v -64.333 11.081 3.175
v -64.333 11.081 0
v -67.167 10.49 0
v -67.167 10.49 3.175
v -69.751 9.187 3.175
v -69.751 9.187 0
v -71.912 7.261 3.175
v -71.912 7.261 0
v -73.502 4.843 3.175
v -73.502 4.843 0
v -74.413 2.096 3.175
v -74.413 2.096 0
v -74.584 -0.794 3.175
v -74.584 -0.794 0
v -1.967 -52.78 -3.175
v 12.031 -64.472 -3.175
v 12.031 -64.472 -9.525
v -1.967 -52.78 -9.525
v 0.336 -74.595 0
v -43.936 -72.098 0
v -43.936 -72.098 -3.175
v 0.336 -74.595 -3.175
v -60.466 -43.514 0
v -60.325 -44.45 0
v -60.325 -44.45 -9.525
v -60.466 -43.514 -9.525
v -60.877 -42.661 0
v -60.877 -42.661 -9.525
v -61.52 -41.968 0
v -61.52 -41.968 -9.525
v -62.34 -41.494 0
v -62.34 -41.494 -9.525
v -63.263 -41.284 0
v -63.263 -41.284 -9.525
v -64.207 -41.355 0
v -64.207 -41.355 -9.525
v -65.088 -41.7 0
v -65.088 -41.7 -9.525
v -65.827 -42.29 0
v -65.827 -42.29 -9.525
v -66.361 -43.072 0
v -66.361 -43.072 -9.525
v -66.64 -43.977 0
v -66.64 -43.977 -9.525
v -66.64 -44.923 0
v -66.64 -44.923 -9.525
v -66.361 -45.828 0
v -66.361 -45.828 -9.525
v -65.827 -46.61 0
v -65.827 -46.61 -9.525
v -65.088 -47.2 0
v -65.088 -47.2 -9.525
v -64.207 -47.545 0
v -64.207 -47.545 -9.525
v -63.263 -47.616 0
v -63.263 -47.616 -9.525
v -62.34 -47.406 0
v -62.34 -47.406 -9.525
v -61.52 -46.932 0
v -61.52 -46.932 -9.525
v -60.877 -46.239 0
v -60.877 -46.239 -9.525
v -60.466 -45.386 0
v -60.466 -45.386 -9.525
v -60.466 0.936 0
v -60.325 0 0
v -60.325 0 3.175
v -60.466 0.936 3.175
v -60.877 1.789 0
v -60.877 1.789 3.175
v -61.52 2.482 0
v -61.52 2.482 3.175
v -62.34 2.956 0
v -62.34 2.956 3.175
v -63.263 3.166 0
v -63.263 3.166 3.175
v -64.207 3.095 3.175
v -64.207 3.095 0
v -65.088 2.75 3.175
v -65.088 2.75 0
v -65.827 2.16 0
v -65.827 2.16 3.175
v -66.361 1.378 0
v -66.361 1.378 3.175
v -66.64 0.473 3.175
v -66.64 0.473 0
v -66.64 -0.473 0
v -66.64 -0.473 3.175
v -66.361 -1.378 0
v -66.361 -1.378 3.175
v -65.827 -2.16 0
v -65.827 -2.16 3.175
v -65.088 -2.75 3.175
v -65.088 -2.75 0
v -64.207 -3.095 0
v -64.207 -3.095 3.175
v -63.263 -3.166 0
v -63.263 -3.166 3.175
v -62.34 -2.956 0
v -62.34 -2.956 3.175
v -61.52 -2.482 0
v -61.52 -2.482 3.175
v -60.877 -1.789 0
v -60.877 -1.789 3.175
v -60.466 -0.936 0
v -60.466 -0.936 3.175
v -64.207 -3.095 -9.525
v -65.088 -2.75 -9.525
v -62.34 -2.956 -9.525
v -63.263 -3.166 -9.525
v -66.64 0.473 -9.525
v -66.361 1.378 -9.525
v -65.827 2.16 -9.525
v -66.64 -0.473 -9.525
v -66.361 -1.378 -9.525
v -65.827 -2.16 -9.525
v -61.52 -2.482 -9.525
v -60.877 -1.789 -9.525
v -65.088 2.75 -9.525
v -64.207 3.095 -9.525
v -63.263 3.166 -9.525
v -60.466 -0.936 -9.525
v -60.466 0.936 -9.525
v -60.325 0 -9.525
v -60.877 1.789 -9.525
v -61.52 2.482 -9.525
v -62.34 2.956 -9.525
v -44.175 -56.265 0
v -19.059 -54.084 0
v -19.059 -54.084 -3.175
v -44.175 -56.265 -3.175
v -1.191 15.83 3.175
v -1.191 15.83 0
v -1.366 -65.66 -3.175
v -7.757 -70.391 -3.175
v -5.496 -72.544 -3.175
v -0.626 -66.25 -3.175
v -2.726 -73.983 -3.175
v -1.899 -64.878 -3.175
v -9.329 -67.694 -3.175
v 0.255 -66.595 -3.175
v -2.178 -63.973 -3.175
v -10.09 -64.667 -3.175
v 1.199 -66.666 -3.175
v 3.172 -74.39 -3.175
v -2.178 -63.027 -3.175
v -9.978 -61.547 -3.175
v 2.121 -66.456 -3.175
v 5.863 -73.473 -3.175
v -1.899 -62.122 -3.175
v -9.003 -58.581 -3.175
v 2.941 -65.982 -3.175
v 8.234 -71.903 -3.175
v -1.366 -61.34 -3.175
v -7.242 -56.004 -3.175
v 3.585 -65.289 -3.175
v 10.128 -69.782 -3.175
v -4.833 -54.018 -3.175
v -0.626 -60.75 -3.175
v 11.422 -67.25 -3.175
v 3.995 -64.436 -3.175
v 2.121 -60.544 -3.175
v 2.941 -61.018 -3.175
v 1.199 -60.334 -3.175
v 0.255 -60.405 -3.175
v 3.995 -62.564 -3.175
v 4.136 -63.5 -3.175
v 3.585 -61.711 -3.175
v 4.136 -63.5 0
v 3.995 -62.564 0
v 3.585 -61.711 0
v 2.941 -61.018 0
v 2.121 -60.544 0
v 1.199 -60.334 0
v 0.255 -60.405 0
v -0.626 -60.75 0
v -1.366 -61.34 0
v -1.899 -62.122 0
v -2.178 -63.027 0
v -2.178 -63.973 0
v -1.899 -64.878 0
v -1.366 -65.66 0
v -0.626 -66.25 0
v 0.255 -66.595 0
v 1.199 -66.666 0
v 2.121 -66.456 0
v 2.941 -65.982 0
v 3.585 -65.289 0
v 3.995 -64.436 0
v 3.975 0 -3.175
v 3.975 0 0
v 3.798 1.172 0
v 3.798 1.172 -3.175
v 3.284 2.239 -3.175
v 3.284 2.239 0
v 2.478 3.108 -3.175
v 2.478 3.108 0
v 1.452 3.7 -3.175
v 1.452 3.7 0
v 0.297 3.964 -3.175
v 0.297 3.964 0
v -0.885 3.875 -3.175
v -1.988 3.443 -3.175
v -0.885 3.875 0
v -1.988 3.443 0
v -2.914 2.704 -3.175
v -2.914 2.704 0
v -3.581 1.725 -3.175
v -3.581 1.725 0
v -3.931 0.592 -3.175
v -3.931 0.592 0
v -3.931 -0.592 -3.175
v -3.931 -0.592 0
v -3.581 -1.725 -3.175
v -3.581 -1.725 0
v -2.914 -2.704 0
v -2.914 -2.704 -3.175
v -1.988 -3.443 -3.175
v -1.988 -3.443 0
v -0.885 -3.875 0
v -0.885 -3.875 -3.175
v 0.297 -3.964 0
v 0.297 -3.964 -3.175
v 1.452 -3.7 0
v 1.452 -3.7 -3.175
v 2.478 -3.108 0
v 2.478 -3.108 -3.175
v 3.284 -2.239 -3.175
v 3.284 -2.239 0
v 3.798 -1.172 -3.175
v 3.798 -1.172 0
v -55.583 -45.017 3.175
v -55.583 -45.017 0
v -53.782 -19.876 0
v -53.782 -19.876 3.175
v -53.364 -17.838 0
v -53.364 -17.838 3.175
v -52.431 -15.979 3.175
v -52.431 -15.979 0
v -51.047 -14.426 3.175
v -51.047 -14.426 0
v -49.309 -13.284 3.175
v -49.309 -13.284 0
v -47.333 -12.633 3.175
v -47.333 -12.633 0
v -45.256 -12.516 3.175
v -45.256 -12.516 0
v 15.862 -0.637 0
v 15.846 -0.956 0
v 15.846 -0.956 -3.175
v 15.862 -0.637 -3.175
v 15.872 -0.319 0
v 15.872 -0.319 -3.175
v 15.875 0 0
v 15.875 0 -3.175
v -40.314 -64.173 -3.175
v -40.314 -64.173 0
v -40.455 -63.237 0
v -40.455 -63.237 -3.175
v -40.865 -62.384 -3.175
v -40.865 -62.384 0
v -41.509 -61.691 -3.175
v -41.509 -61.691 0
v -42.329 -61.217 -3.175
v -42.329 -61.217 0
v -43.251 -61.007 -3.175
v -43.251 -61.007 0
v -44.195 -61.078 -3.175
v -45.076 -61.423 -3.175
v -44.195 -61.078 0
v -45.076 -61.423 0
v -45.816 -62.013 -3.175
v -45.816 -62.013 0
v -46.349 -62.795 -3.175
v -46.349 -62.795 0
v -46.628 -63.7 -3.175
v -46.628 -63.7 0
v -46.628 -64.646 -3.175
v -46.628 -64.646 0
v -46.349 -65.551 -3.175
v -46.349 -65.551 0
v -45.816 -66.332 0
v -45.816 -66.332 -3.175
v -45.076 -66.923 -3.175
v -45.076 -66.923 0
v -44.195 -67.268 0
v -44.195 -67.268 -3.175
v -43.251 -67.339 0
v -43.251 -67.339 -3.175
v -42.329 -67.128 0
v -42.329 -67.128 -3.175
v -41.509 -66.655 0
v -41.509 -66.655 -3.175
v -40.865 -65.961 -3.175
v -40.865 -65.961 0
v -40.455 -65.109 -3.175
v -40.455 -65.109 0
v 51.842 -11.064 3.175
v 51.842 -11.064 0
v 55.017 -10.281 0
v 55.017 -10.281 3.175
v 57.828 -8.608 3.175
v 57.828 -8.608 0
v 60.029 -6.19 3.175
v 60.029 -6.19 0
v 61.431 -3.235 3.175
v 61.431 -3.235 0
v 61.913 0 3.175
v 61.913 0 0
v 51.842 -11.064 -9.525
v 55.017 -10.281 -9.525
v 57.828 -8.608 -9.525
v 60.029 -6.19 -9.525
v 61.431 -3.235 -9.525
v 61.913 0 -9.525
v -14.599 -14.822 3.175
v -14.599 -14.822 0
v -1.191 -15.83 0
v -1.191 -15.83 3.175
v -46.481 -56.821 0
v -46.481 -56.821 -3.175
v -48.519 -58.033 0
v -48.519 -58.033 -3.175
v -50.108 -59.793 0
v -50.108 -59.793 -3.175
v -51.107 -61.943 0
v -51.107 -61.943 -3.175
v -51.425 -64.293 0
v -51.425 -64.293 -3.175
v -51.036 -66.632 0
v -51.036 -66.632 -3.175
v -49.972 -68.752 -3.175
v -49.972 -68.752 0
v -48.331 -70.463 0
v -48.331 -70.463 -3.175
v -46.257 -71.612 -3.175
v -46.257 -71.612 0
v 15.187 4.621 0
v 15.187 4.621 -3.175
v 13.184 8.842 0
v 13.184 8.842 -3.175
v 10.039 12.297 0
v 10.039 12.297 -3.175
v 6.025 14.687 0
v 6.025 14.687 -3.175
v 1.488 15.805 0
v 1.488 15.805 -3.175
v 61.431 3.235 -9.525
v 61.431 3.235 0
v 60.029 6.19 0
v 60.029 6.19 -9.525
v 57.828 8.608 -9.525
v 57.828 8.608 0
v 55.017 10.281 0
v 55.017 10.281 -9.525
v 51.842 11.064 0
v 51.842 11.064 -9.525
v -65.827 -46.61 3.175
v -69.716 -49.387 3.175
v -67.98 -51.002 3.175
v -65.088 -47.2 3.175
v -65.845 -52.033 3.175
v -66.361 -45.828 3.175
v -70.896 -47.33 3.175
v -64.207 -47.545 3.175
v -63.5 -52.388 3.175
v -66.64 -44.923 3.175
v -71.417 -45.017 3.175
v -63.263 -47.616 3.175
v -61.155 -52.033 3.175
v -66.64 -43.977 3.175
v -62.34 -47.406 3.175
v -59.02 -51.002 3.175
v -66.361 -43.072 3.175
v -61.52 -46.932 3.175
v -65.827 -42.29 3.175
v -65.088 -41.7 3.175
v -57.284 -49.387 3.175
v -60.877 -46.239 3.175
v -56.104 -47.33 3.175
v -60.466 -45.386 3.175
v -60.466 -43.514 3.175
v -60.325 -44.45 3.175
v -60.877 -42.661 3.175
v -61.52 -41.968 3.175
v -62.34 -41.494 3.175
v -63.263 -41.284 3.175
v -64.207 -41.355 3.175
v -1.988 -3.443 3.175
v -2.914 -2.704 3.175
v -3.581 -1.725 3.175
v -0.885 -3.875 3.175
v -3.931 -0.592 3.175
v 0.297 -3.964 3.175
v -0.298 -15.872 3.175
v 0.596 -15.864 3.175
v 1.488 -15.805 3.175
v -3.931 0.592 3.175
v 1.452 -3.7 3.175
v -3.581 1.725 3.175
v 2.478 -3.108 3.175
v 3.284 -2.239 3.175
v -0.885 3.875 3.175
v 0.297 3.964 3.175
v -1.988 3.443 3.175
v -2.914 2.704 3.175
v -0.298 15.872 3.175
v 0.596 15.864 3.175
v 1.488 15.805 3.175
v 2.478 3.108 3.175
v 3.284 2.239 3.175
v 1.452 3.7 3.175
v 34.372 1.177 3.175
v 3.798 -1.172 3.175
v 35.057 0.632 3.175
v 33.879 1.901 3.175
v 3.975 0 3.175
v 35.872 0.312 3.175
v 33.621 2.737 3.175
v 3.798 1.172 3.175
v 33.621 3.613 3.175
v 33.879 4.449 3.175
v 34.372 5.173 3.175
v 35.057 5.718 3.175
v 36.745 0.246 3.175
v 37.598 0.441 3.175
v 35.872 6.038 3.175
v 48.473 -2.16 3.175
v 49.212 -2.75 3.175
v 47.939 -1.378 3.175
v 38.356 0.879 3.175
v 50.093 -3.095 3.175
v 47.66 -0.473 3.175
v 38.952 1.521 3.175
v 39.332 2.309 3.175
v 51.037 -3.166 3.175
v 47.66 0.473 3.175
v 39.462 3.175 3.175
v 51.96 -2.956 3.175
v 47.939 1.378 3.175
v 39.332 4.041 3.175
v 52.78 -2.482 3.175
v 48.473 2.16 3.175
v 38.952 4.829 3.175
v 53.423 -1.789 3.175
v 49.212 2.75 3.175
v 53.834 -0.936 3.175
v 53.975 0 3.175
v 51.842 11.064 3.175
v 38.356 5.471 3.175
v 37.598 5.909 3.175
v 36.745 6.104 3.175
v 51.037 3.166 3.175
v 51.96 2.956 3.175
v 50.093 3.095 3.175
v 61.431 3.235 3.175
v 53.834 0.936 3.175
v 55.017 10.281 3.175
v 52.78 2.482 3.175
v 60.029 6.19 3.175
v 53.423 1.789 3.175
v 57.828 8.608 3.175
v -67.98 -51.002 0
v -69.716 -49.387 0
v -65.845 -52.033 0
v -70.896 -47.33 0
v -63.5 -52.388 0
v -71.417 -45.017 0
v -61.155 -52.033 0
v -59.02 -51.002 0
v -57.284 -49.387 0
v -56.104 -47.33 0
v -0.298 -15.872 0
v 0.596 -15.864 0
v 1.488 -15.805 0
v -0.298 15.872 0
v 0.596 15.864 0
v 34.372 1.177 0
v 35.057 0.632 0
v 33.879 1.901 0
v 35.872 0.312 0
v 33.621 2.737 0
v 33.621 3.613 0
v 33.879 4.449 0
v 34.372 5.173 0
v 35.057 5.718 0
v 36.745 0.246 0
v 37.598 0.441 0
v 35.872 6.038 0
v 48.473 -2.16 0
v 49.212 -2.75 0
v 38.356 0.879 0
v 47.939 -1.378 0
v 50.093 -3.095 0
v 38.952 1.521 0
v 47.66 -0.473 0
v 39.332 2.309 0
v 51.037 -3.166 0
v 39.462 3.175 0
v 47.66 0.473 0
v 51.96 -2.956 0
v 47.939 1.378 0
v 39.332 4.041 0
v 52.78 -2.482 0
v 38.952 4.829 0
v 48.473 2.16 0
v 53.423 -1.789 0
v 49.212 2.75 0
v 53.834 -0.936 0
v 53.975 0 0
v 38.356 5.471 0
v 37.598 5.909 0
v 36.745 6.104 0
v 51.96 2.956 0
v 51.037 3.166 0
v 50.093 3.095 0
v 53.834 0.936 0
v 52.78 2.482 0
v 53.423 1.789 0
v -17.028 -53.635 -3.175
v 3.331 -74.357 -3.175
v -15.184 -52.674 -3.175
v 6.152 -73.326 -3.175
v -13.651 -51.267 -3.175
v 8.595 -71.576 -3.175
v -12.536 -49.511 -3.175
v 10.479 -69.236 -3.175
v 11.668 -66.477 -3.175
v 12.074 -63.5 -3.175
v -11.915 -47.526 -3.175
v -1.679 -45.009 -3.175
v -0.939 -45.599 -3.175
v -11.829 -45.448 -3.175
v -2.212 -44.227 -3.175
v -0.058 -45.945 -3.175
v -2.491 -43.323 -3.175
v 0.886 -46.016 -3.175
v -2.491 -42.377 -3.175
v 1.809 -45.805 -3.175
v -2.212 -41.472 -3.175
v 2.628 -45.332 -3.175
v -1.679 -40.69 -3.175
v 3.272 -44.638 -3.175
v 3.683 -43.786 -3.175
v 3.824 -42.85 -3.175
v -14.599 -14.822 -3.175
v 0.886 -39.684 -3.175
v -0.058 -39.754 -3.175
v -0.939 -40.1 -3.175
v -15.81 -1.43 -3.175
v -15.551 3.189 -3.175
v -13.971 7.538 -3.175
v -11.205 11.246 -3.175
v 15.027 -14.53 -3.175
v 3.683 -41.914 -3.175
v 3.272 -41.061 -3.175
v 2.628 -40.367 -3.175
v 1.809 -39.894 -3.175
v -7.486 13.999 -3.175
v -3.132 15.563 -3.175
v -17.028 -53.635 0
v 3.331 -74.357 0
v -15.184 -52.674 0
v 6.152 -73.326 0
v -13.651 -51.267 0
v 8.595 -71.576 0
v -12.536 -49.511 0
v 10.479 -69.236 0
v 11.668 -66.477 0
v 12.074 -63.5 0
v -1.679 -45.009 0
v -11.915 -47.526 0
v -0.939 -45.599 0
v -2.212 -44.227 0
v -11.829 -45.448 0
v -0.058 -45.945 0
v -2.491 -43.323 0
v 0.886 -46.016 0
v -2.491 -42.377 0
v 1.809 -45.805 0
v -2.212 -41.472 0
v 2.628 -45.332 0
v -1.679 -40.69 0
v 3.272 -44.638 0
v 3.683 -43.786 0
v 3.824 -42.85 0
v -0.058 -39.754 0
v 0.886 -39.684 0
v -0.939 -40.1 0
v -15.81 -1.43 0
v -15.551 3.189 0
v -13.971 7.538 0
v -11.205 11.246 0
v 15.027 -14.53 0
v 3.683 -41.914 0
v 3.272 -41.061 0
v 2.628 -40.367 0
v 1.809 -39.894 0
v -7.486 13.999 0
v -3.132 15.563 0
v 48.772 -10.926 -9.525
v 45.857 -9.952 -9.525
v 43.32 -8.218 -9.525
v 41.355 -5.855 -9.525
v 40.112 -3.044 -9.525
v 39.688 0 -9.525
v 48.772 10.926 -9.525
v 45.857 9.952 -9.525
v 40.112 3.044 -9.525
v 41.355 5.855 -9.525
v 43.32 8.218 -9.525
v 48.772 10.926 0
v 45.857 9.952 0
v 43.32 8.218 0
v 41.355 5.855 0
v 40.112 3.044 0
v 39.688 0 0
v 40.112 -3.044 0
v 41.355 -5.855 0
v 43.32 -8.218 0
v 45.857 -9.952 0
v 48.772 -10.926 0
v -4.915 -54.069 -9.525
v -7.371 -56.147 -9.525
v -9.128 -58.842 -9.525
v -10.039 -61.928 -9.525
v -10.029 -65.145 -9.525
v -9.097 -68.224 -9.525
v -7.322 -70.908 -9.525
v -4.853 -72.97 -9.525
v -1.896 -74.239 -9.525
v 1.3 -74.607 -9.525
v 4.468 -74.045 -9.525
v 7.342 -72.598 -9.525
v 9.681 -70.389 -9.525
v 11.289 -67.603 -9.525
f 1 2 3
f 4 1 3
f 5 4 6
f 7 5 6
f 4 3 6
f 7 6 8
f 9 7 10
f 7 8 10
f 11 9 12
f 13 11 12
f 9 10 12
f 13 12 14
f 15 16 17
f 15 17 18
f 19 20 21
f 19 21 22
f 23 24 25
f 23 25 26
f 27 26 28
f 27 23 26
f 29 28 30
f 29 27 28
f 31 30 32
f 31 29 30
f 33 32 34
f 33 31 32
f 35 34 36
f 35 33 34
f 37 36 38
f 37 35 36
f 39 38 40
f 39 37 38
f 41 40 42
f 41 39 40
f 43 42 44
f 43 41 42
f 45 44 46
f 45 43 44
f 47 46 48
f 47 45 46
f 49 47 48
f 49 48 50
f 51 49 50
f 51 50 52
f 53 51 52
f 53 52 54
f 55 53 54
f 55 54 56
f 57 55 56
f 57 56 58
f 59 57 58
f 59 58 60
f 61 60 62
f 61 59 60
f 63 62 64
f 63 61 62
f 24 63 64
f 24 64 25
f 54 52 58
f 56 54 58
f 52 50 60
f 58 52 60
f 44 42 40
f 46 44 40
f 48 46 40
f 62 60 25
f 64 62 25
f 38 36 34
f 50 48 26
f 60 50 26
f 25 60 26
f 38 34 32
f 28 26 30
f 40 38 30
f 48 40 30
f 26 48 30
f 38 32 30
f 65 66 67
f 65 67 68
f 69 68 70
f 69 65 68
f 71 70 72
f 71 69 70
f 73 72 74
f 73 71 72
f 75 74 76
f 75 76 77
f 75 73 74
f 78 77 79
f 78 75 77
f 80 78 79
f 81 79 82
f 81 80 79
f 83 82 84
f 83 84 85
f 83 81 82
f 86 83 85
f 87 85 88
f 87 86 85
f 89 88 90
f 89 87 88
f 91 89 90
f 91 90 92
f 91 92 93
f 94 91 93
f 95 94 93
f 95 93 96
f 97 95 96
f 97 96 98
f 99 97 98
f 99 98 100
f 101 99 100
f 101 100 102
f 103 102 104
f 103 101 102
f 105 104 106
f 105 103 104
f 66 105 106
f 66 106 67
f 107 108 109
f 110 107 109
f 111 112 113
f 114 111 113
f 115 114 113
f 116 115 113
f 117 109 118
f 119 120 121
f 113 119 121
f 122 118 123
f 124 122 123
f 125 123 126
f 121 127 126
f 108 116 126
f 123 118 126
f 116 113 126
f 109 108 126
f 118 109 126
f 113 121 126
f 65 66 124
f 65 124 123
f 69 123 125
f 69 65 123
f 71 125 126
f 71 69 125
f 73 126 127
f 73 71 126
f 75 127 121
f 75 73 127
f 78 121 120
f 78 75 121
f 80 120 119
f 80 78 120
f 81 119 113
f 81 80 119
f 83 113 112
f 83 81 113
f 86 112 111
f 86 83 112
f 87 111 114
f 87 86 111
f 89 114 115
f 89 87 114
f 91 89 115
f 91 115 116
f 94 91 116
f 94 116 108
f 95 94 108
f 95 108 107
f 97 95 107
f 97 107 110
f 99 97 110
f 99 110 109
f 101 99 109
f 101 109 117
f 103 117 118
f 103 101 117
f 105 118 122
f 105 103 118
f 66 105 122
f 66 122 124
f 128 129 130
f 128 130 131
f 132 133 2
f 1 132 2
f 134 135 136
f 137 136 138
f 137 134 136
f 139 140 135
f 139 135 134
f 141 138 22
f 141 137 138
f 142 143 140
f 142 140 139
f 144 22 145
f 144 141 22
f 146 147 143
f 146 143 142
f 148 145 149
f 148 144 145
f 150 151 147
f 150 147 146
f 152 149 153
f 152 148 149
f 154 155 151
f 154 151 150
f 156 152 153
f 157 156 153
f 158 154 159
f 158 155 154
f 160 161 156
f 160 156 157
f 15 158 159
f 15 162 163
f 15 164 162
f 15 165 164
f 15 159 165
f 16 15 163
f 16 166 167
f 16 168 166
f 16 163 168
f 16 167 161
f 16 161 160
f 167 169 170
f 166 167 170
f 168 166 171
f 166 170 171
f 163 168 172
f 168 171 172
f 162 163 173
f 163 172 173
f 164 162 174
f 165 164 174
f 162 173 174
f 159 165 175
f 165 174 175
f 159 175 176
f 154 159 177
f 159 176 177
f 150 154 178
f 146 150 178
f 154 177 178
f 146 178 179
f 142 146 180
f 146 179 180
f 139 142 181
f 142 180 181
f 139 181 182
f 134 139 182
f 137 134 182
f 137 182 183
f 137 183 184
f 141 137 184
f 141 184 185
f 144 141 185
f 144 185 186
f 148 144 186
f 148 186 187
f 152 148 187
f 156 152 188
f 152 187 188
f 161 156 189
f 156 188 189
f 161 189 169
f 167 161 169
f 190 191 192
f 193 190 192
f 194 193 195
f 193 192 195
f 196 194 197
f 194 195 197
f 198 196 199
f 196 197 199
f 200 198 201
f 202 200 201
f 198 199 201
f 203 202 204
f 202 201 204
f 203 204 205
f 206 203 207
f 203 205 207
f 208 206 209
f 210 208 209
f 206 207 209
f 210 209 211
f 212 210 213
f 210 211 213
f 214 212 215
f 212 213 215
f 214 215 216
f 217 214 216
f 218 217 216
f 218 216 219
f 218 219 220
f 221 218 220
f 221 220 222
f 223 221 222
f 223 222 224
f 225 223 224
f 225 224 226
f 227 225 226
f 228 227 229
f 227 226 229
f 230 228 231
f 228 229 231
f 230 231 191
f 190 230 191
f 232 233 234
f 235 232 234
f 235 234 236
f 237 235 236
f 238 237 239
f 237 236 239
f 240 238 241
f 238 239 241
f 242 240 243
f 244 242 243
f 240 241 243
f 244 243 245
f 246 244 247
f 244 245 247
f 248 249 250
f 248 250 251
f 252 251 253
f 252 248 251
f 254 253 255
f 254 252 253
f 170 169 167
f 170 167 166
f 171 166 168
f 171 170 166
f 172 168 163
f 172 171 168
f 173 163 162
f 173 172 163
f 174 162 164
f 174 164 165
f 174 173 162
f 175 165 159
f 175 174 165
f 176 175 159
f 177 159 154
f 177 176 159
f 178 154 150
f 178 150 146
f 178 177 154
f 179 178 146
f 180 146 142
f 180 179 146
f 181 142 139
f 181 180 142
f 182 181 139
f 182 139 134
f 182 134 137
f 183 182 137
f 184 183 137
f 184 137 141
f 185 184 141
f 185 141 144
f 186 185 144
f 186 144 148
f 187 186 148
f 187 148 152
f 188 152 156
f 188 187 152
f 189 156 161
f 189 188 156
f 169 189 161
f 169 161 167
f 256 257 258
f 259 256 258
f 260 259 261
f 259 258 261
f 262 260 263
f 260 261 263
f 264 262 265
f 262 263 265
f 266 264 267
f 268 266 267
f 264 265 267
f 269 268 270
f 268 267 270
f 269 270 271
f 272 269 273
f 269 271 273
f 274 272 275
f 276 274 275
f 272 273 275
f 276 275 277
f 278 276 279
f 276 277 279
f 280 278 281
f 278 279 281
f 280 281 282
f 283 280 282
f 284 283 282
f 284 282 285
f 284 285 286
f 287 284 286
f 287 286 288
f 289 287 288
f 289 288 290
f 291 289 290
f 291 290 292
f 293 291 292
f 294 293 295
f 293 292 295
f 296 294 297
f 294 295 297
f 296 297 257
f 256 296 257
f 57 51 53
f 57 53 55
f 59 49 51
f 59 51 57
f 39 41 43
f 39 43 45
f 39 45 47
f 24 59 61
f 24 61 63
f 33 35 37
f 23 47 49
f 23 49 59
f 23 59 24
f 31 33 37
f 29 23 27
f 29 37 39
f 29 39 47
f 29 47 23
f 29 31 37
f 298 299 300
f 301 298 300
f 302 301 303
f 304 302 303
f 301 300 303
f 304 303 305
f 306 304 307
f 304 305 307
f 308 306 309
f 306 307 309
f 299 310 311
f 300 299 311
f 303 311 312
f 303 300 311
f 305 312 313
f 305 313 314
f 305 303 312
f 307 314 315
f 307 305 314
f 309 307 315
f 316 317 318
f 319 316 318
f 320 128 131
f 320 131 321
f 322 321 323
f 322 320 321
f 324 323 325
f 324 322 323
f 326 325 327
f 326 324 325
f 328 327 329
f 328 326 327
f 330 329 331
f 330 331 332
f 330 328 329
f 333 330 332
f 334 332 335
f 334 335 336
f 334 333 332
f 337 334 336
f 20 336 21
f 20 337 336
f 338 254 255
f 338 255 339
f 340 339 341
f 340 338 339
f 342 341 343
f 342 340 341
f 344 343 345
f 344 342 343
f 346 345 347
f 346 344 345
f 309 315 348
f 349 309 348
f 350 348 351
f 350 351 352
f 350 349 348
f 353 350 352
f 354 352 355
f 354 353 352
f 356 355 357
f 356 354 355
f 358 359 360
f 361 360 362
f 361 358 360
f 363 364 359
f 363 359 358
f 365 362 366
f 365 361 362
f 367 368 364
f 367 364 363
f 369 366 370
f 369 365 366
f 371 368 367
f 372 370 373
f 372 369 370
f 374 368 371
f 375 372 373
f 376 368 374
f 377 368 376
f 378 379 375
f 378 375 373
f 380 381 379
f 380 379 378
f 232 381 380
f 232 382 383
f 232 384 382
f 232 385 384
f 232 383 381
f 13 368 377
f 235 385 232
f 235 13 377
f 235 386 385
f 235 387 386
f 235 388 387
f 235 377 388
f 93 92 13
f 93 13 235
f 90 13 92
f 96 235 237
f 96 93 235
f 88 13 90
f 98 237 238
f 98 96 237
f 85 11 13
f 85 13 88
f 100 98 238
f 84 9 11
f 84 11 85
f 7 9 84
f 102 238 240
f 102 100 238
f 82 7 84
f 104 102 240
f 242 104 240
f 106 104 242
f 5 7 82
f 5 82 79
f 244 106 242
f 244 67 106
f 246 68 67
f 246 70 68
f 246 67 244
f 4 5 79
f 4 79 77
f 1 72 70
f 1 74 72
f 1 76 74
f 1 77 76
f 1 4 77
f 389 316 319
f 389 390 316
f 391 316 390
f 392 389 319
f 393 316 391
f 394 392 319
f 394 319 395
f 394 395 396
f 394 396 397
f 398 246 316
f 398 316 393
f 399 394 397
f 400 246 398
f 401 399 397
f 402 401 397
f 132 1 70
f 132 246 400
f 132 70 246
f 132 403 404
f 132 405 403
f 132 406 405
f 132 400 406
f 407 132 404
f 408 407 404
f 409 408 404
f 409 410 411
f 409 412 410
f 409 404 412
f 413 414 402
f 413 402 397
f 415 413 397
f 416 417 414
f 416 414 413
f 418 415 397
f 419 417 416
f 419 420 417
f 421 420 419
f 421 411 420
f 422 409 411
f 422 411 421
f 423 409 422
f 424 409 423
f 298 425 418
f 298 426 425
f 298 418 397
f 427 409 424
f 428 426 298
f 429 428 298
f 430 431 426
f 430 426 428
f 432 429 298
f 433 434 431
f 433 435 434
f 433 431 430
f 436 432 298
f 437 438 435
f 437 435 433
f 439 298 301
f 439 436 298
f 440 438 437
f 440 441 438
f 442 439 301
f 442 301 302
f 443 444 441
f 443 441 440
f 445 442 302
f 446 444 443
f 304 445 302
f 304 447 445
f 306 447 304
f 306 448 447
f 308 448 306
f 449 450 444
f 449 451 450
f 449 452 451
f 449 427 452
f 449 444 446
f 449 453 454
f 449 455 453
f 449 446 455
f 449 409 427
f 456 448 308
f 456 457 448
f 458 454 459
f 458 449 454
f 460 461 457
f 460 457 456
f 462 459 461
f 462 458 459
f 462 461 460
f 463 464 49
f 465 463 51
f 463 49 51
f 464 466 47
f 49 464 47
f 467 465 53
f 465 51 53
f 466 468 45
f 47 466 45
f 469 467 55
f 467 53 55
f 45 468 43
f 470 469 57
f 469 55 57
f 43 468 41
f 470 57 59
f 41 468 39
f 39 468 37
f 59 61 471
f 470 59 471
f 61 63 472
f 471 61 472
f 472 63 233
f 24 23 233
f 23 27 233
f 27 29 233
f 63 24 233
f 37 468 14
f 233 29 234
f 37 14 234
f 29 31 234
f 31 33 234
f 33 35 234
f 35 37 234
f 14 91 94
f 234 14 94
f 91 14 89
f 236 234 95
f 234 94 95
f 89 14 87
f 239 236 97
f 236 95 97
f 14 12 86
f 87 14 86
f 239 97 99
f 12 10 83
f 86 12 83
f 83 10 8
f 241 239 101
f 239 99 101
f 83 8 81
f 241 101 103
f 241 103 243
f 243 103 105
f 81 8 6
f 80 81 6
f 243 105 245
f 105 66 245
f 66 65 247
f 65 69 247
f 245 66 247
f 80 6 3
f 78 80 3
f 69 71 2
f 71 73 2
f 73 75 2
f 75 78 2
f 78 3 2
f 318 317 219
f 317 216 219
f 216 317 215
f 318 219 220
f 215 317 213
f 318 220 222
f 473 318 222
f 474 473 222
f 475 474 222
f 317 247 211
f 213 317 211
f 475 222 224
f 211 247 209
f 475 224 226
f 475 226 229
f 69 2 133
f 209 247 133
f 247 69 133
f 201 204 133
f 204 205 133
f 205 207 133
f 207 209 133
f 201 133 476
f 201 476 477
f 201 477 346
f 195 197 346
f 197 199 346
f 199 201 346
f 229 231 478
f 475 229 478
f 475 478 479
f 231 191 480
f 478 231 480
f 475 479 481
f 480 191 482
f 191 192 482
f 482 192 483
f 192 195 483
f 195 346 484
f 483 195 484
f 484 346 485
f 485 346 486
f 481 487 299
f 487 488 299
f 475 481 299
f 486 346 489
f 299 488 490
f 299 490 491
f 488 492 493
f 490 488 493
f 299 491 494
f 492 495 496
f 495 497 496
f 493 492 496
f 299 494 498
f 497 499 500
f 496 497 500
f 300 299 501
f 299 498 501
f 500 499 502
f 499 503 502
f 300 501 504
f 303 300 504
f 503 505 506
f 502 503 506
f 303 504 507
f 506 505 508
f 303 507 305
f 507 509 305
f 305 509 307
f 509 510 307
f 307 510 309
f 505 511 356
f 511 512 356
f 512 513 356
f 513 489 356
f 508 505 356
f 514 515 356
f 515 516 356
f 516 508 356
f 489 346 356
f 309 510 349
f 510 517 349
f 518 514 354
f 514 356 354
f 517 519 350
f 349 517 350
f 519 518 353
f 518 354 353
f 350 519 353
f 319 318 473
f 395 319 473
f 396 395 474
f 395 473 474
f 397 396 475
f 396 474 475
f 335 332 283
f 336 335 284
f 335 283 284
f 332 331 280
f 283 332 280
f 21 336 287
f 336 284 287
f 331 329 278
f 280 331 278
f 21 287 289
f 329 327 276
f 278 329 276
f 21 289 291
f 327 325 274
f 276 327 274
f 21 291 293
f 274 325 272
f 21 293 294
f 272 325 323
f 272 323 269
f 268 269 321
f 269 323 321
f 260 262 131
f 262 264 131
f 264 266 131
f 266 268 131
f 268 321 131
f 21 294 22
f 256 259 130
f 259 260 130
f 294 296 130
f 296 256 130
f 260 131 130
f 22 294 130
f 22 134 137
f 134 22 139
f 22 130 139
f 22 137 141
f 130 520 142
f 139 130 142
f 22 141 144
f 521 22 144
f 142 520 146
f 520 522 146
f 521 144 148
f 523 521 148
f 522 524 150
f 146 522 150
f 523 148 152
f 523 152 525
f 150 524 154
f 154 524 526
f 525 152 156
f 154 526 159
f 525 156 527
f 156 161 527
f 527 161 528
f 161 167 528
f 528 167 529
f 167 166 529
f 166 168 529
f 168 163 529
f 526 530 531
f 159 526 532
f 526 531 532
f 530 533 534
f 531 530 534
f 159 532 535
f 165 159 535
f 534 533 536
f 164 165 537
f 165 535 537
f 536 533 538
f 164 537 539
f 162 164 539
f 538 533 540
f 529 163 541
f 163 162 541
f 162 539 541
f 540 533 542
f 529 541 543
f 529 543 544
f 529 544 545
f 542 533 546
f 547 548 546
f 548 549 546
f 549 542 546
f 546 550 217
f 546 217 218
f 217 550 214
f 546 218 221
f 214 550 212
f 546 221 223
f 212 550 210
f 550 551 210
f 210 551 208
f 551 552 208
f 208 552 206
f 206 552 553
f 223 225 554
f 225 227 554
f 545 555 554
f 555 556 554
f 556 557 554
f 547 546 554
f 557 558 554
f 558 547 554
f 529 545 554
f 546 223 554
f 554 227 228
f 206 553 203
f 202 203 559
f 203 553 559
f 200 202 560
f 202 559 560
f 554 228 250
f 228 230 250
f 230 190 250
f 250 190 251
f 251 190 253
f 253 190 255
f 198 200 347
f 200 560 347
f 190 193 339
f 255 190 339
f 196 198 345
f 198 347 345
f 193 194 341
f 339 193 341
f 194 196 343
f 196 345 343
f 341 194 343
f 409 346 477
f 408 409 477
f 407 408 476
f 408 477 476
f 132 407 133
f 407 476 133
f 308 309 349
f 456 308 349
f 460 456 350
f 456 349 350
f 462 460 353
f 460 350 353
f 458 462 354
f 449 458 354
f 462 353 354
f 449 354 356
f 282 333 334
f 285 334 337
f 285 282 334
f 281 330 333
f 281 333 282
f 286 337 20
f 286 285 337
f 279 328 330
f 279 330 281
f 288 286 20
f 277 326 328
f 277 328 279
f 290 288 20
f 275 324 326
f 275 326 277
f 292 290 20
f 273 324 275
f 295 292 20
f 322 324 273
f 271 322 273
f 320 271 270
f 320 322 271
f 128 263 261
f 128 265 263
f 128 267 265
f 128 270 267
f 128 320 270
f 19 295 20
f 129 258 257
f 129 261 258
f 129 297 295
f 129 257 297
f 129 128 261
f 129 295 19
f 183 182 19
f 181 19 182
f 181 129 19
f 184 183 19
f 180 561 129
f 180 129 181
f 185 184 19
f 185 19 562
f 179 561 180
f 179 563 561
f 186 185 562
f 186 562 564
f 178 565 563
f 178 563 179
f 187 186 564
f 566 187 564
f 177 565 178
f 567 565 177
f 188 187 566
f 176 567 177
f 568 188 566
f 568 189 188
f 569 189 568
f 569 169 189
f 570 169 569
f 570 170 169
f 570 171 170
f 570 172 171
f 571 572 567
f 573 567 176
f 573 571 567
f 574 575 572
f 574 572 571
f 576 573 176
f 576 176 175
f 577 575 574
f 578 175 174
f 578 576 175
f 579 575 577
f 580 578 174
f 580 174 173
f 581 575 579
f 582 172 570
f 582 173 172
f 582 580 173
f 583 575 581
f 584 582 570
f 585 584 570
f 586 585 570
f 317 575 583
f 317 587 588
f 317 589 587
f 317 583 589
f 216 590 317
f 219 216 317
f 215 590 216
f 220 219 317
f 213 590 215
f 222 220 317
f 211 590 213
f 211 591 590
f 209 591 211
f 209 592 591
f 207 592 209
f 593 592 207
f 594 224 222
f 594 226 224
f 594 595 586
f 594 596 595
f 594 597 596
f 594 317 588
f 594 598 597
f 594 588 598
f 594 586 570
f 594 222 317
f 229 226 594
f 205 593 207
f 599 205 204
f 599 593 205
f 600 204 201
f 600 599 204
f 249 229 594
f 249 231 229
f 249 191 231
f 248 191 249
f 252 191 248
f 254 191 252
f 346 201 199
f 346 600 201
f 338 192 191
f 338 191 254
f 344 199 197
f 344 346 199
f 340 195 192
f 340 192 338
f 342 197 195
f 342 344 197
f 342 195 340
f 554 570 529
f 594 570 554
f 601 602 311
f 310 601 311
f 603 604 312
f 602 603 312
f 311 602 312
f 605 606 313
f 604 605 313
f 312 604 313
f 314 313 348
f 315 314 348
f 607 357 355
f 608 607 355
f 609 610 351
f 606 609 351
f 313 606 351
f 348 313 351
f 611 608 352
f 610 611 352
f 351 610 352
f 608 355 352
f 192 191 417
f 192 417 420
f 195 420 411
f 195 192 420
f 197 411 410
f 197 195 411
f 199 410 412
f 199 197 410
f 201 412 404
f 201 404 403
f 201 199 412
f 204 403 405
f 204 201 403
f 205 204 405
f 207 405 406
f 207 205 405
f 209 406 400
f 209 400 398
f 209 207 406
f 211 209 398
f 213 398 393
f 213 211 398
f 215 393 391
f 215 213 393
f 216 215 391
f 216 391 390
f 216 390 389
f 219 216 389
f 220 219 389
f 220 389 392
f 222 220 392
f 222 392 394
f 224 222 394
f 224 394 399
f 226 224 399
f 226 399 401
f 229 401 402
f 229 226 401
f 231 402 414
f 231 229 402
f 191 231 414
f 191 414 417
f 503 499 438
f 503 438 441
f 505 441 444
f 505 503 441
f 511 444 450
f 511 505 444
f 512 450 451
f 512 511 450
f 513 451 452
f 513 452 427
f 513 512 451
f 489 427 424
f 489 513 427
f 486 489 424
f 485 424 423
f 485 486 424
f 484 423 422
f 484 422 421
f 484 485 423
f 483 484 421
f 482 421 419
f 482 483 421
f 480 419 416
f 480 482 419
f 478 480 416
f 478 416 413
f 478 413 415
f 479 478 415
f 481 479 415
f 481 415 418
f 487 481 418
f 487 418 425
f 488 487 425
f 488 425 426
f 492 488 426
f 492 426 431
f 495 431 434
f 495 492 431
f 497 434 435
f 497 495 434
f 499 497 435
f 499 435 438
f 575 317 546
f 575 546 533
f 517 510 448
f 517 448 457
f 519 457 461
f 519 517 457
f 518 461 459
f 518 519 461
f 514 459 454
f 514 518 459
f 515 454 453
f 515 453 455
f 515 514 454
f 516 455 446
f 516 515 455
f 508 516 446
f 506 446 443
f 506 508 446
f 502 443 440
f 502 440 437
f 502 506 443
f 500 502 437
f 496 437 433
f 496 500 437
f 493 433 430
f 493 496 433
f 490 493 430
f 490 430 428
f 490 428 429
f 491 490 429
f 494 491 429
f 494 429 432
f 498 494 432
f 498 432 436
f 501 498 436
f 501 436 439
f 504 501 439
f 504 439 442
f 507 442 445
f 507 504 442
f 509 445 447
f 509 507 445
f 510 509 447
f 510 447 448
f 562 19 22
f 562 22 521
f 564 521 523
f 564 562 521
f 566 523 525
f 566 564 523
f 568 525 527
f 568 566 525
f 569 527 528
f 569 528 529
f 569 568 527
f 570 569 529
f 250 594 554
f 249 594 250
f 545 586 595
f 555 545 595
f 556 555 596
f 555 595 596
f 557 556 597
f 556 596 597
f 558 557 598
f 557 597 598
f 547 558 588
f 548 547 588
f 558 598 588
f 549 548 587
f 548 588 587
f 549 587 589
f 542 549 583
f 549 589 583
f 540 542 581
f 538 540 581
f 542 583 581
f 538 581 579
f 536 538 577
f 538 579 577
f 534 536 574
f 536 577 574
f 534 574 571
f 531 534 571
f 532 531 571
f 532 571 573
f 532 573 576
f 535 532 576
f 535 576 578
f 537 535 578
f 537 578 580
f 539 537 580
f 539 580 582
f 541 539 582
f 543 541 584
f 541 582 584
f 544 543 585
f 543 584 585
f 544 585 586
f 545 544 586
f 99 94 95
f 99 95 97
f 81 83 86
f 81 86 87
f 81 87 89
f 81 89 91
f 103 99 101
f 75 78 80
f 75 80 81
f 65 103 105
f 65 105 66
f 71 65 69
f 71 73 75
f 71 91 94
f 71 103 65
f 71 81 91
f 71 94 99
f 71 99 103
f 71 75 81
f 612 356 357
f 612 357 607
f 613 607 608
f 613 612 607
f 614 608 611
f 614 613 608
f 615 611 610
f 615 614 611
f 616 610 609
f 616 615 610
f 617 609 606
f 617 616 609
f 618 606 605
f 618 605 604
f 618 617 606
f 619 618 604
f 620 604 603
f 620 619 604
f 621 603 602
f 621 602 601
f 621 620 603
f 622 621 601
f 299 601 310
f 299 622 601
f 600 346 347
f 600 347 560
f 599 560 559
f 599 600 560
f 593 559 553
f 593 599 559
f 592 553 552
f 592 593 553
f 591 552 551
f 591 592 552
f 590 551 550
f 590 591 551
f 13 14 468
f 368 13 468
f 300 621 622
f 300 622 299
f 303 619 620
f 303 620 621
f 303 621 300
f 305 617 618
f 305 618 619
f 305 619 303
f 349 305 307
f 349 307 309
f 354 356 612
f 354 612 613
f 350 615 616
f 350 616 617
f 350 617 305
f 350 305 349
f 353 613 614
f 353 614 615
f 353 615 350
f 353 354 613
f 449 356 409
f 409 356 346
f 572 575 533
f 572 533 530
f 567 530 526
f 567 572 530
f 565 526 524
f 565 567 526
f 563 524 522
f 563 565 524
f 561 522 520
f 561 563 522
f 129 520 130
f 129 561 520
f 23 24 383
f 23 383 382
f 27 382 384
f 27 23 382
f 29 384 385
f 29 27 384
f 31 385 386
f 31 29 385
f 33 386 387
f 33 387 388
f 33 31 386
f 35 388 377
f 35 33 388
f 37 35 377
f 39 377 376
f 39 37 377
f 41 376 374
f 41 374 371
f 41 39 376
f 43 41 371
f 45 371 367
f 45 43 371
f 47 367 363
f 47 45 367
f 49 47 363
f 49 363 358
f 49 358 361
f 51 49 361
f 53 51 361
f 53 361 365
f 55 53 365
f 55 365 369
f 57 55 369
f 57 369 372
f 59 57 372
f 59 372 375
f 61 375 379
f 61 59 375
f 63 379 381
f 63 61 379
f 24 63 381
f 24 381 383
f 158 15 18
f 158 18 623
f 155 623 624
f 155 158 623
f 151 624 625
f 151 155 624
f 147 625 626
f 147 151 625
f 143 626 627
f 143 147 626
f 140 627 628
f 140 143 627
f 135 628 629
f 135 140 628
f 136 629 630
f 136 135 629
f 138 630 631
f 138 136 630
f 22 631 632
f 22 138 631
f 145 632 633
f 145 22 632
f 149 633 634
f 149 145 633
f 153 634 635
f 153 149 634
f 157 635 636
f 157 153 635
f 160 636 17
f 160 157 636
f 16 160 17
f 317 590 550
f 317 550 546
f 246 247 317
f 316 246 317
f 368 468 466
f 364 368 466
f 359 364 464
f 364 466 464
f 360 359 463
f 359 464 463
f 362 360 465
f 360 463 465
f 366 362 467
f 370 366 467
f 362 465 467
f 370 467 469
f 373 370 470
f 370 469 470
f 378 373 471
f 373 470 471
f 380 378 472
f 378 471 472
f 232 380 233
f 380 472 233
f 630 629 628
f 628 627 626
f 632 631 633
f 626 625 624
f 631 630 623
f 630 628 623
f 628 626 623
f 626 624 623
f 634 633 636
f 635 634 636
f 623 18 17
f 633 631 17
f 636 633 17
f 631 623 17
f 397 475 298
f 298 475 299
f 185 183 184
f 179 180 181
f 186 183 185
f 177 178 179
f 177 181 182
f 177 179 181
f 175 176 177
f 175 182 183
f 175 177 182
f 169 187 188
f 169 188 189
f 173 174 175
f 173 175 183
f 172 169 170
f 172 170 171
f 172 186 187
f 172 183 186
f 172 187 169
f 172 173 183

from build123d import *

# Parameters (mm, degrees)
F0_R     = 3.9751
F0_R_2   = 2.9368273142
F0_R_3   = 3.175
F1_DEPTH = 3.175
F2_DEPTH = 3.175
F6_DEPTH = 9.525


with BuildPart() as f1:
    # F0 (on Top) → F1 (new body)
    with BuildSketch(Plane.XY):
        with BuildLine():
            Line((-15.8104636817, -1.4299871225), (-14.5992326801, -14.8218026558))
            Line((-14.5992326801, -14.8218026558), (-1.190625, -15.8302885984))
            ThreePointArc((-1.190625, -15.8302885984), (-11.1400819, -11.3099160147), (-15.8104636817, -1.4299871225))
        make_face()
        with BuildLine():
            ThreePointArc((1.48828125, 15.8050828508), (0.1493607821, 15.87429735), (-1.190625, 15.8302885984))
            ThreePointArc((-1.190625, 15.8302885984), (-12.1135681606, 10.2604625343), (-15.8104636817, -1.4299871225))
            ThreePointArc((-15.8104636817, -1.4299871225), (-11.1400819, -11.3099160147), (-1.190625, -15.8302885984))
            ThreePointArc((-1.190625, -15.8302885984), (0.1493607821, -15.87429735), (1.48828125, -15.8050828508))
            ThreePointArc((1.48828125, -15.8050828508), (11.4125664299, -11.034897031), (15.8462028679, -0.955761303))
            ThreePointArc((15.8462028679, -0.955761303), (15.8677990838, -0.478097517), (15.875, 0))
            ThreePointArc((15.875, 0), (11.7397208196, 10.6861864142), (1.48828125, 15.8050828508))
        make_face()
        Circle(F0_R, mode=Mode.SUBTRACT)
        with BuildLine():
            ThreePointArc((15.8462028679, -0.955761303), (11.4125664299, -11.034897031), (1.48828125, -15.8050828508))
            Line((1.48828125, -15.8050828508), (15.0274645187, -14.5301694075))
            Line((15.0274645187, -14.5301694075), (15.8462028679, -0.955761303))
        make_face()
        with BuildLine():
            Line((51.841796875, 11.0635579956), (1.48828125, 15.8050828508))
            ThreePointArc((1.48828125, 15.8050828508), (11.7397208196, 10.6861864142), (15.875, 0))
            ThreePointArc((15.875, 0), (15.8677990838, -0.478097517), (15.8462028679, -0.955761303))
            Line((15.8462028679, -0.955761303), (15.0274645187, -14.5301694075))
            Line((15.0274645187, -14.5301694075), (51.841796875, -11.0635579956))
            ThreePointArc((51.841796875, -11.0635579956), (39.6875, 0), (51.841796875, 11.0635579956))
        make_face()
        with Locations((36.5252, 3.175)):
            Circle(F0_R_2, mode=Mode.SUBTRACT)
        with BuildLine():
            ThreePointArc((61.9125, 0), (59.0178045737, 7.4803304899), (51.841796875, 11.0635579956))
            ThreePointArc((51.841796875, 11.0635579956), (39.6875, 0), (51.841796875, -11.0635579956))
            ThreePointArc((51.841796875, -11.0635579956), (59.0178045737, -7.4803304899), (61.9125, 0))
        make_face()
        with Locations((50.8, 0)):
            Circle(F0_R_3, mode=Mode.SUBTRACT)
        with BuildLine():
            ThreePointArc((-71.417225382, -45.0169642857), (-63.7836633398, -36.5175702739), (-55.5625, -44.45))
            ThreePointArc((-55.5625, -44.45), (-55.5675702739, -44.7336633398), (-55.582774618, -45.0169642857))
            Line((-55.582774618, -45.0169642857), (-53.7823906678, -19.875970633))
            ThreePointArc((-53.7823906678, -19.875970633), (-51.0474657939, -14.4257039105), (-45.2562327252, -12.5160335315))
            Line((-45.2562327252, -12.5160335315), (-14.5992326801, -14.8218026558))
            Line((-14.5992326801, -14.8218026558), (-15.8104636817, -1.4299871225))
            ThreePointArc((-15.8104636817, -1.4299871225), (-12.1135681606, 10.2604625343), (-1.190625, 15.8302885984))
            Line((-1.190625, 15.8302885984), (-64.3334375, 11.0812020189))
            ThreePointArc((-64.3334375, 11.0812020189), (-55.9426829486, 8.1470617547), (-52.3875, 0))
            ThreePointArc((-52.3875, 0), (-63.1028713243, -11.1054016166), (-74.5841155347, -0.79375))
            Line((-74.5841155347, -0.79375), (-71.417225382, -45.0169642857))
        make_face()
        with BuildLine():
            ThreePointArc((-55.582774618, -45.0169642857), (-55.5675702739, -44.7336633398), (-55.5625, -44.45))
            ThreePointArc((-55.5625, -44.45), (-63.7836633398, -36.5175702739), (-71.417225382, -45.0169642857))
            ThreePointArc((-71.417225382, -45.0169642857), (-63.5, -52.3875), (-55.582774618, -45.0169642857))
        make_face()
        with Locations((-63.5, -44.45)):
            Circle(F0_R_3, mode=Mode.SUBTRACT)
        with BuildLine():
            ThreePointArc((-64.3334375, 11.0812020189), (-71.9119343166, 7.2613371567), (-74.5841155347, -0.79375))
            ThreePointArc((-74.5841155347, -0.79375), (-63.1028713243, -11.1054016166), (-52.3875, 0))
            ThreePointArc((-52.3875, 0), (-55.9426829486, 8.1470617547), (-64.3334375, 11.0812020189))
        make_face()
        with Locations((-63.5, 0)):
            Circle(F0_R_3, mode=Mode.SUBTRACT)
    extrude(amount=F1_DEPTH)


with BuildPart() as f2:
    # F0 (on Top) → F2 (new body)
    with BuildSketch(Plane.XY):
        with BuildLine():
            Line((-1.190625, -15.8302885984), (-14.5992326801, -14.8218026558))
            Line((-14.5992326801, -14.8218026558), (-11.8292558733, -45.4476852336))
            ThreePointArc((-11.8292558733, -45.4476852336), (-13.6510903541, -51.2671458673), (-19.0593540531, -54.0842164564))
            Line((-19.0593540531, -54.0842164564), (-44.1753266645, -56.2652083861))
            ThreePointArc((-44.1753266645, -56.2652083861), (-38.1242534608, -58.3225456153), (-35.5511433259, -64.1729496719))
            ThreePointArc((-35.5511433259, -64.1729496719), (-38.0363062259, -69.941478635), (-43.9356287176, -72.0978541073))
            Line((-43.9356287176, -72.0978541073), (0.3355771258, -74.5948662095))
            ThreePointArc((0.3355771258, -74.5948662095), (-6.6719152658, -55.4240594516), (12.0738566741, -63.5))
            Line((12.0738566741, -63.5), (15.0274645187, -14.5301694075))
            Line((15.0274645187, -14.5301694075), (1.48828125, -15.8050828508))
            ThreePointArc((1.48828125, -15.8050828508), (0.1493607821, -15.87429735), (-1.190625, -15.8302885984))
        make_face()
        with Locations((0.6487234837, -42.8498)):
            Circle(F0_R_3, mode=Mode.SUBTRACT)
        with BuildLine():
            ThreePointArc((0.3355771258, -74.5948662095), (8.5946286141, -71.5759405484), (12.0738566741, -63.5))
            ThreePointArc((12.0738566741, -63.5), (-6.6719152658, -55.4240594516), (0.3355771258, -74.5948662095))
        make_face()
        with Locations((0.9613566741, -63.5)):
            Circle(F0_R_3, mode=Mode.SUBTRACT)
        with BuildLine():
            ThreePointArc((-35.5511433259, -64.1729496719), (-38.1242534608, -58.3225456153), (-44.1753266645, -56.2652083861))
            ThreePointArc((-44.1753266645, -56.2652083861), (-51.42523383, -64.2931054869), (-43.9356287176, -72.0978541073))
            ThreePointArc((-43.9356287176, -72.0978541073), (-38.0363062259, -69.941478635), (-35.5511433259, -64.1729496719))
        make_face()
        with Locations((-43.4886433259, -64.1729496719)):
            Circle(F0_R_3, mode=Mode.SUBTRACT)
        with BuildLine():
            ThreePointArc((15.8462028679, -0.955761303), (11.4125664299, -11.034897031), (1.48828125, -15.8050828508))
            Line((1.48828125, -15.8050828508), (15.0274645187, -14.5301694075))
            Line((15.0274645187, -14.5301694075), (15.8462028679, -0.955761303))
        make_face()
        with BuildLine():
            ThreePointArc((1.48828125, 15.8050828508), (0.1493607821, 15.87429735), (-1.190625, 15.8302885984))
            ThreePointArc((-1.190625, 15.8302885984), (-12.1135681606, 10.2604625343), (-15.8104636817, -1.4299871225))
            ThreePointArc((-15.8104636817, -1.4299871225), (-11.1400819, -11.3099160147), (-1.190625, -15.8302885984))
            ThreePointArc((-1.190625, -15.8302885984), (0.1493607821, -15.87429735), (1.48828125, -15.8050828508))
            ThreePointArc((1.48828125, -15.8050828508), (11.4125664299, -11.034897031), (15.8462028679, -0.955761303))
            ThreePointArc((15.8462028679, -0.955761303), (15.8677990838, -0.478097517), (15.875, 0))
            ThreePointArc((15.875, 0), (11.7397208196, 10.6861864142), (1.48828125, 15.8050828508))
        make_face()
        Circle(F0_R, mode=Mode.SUBTRACT)
        with BuildLine():
            Line((-15.8104636817, -1.4299871225), (-14.5992326801, -14.8218026558))
            Line((-14.5992326801, -14.8218026558), (-1.190625, -15.8302885984))
            ThreePointArc((-1.190625, -15.8302885984), (-11.1400819, -11.3099160147), (-15.8104636817, -1.4299871225))
        make_face()
    extrude(amount=-F2_DEPTH)


with BuildPart() as f6:
    # F3 (on face) → F6 (new body, through all)
    with BuildSketch(Plane.XY):
        with BuildLine():
            Line((12.031224592, -64.4724610689), (-1.9671503943, -52.7803217119))
            ThreePointArc((-1.9671503943, -52.7803217119), (-6.1623340692, -72.0288150668), (12.031224592, -64.4724610689))
        make_face()
    extrude(amount=-F6_DEPTH)

    # F7: cut F2
    add(f2.part, mode=Mode.SUBTRACT)


with BuildPart() as f6b:
    # F0 (on Top) → F6, piece 2 (new body, through all)
    with BuildSketch(Plane.XY):
        with BuildLine():
            ThreePointArc((61.9125, 0), (59.0178045737, 7.4803304899), (51.841796875, 11.0635579956))
            ThreePointArc((51.841796875, 11.0635579956), (39.6875, 0), (51.841796875, -11.0635579956))
            ThreePointArc((51.841796875, -11.0635579956), (59.0178045737, -7.4803304899), (61.9125, 0))
        make_face()
        with Locations((50.8, 0)):
            Circle(F0_R_3, mode=Mode.SUBTRACT)
        with Locations((50.8, 0)):
            Circle(F0_R_3)
    extrude(amount=-F6_DEPTH)


with BuildPart() as f6c:
    # F0 (on Top) → F6, piece 3 (new body, through all)
    with BuildSketch(Plane.XY):
        with Locations((-63.5, -44.45)):
            Circle(F0_R_3)
    extrude(amount=-F6_DEPTH)


with BuildPart() as f6d:
    # F0 (on Top) → F6, piece 4 (new body, through all)
    with BuildSketch(Plane.XY):
        with Locations((-63.5, 0)):
            Circle(F0_R_3)
    extrude(amount=-F6_DEPTH)


solid = Compound([f1.part, f2.part, f6.part, f6b.part, f6c.part, f6d.part])
